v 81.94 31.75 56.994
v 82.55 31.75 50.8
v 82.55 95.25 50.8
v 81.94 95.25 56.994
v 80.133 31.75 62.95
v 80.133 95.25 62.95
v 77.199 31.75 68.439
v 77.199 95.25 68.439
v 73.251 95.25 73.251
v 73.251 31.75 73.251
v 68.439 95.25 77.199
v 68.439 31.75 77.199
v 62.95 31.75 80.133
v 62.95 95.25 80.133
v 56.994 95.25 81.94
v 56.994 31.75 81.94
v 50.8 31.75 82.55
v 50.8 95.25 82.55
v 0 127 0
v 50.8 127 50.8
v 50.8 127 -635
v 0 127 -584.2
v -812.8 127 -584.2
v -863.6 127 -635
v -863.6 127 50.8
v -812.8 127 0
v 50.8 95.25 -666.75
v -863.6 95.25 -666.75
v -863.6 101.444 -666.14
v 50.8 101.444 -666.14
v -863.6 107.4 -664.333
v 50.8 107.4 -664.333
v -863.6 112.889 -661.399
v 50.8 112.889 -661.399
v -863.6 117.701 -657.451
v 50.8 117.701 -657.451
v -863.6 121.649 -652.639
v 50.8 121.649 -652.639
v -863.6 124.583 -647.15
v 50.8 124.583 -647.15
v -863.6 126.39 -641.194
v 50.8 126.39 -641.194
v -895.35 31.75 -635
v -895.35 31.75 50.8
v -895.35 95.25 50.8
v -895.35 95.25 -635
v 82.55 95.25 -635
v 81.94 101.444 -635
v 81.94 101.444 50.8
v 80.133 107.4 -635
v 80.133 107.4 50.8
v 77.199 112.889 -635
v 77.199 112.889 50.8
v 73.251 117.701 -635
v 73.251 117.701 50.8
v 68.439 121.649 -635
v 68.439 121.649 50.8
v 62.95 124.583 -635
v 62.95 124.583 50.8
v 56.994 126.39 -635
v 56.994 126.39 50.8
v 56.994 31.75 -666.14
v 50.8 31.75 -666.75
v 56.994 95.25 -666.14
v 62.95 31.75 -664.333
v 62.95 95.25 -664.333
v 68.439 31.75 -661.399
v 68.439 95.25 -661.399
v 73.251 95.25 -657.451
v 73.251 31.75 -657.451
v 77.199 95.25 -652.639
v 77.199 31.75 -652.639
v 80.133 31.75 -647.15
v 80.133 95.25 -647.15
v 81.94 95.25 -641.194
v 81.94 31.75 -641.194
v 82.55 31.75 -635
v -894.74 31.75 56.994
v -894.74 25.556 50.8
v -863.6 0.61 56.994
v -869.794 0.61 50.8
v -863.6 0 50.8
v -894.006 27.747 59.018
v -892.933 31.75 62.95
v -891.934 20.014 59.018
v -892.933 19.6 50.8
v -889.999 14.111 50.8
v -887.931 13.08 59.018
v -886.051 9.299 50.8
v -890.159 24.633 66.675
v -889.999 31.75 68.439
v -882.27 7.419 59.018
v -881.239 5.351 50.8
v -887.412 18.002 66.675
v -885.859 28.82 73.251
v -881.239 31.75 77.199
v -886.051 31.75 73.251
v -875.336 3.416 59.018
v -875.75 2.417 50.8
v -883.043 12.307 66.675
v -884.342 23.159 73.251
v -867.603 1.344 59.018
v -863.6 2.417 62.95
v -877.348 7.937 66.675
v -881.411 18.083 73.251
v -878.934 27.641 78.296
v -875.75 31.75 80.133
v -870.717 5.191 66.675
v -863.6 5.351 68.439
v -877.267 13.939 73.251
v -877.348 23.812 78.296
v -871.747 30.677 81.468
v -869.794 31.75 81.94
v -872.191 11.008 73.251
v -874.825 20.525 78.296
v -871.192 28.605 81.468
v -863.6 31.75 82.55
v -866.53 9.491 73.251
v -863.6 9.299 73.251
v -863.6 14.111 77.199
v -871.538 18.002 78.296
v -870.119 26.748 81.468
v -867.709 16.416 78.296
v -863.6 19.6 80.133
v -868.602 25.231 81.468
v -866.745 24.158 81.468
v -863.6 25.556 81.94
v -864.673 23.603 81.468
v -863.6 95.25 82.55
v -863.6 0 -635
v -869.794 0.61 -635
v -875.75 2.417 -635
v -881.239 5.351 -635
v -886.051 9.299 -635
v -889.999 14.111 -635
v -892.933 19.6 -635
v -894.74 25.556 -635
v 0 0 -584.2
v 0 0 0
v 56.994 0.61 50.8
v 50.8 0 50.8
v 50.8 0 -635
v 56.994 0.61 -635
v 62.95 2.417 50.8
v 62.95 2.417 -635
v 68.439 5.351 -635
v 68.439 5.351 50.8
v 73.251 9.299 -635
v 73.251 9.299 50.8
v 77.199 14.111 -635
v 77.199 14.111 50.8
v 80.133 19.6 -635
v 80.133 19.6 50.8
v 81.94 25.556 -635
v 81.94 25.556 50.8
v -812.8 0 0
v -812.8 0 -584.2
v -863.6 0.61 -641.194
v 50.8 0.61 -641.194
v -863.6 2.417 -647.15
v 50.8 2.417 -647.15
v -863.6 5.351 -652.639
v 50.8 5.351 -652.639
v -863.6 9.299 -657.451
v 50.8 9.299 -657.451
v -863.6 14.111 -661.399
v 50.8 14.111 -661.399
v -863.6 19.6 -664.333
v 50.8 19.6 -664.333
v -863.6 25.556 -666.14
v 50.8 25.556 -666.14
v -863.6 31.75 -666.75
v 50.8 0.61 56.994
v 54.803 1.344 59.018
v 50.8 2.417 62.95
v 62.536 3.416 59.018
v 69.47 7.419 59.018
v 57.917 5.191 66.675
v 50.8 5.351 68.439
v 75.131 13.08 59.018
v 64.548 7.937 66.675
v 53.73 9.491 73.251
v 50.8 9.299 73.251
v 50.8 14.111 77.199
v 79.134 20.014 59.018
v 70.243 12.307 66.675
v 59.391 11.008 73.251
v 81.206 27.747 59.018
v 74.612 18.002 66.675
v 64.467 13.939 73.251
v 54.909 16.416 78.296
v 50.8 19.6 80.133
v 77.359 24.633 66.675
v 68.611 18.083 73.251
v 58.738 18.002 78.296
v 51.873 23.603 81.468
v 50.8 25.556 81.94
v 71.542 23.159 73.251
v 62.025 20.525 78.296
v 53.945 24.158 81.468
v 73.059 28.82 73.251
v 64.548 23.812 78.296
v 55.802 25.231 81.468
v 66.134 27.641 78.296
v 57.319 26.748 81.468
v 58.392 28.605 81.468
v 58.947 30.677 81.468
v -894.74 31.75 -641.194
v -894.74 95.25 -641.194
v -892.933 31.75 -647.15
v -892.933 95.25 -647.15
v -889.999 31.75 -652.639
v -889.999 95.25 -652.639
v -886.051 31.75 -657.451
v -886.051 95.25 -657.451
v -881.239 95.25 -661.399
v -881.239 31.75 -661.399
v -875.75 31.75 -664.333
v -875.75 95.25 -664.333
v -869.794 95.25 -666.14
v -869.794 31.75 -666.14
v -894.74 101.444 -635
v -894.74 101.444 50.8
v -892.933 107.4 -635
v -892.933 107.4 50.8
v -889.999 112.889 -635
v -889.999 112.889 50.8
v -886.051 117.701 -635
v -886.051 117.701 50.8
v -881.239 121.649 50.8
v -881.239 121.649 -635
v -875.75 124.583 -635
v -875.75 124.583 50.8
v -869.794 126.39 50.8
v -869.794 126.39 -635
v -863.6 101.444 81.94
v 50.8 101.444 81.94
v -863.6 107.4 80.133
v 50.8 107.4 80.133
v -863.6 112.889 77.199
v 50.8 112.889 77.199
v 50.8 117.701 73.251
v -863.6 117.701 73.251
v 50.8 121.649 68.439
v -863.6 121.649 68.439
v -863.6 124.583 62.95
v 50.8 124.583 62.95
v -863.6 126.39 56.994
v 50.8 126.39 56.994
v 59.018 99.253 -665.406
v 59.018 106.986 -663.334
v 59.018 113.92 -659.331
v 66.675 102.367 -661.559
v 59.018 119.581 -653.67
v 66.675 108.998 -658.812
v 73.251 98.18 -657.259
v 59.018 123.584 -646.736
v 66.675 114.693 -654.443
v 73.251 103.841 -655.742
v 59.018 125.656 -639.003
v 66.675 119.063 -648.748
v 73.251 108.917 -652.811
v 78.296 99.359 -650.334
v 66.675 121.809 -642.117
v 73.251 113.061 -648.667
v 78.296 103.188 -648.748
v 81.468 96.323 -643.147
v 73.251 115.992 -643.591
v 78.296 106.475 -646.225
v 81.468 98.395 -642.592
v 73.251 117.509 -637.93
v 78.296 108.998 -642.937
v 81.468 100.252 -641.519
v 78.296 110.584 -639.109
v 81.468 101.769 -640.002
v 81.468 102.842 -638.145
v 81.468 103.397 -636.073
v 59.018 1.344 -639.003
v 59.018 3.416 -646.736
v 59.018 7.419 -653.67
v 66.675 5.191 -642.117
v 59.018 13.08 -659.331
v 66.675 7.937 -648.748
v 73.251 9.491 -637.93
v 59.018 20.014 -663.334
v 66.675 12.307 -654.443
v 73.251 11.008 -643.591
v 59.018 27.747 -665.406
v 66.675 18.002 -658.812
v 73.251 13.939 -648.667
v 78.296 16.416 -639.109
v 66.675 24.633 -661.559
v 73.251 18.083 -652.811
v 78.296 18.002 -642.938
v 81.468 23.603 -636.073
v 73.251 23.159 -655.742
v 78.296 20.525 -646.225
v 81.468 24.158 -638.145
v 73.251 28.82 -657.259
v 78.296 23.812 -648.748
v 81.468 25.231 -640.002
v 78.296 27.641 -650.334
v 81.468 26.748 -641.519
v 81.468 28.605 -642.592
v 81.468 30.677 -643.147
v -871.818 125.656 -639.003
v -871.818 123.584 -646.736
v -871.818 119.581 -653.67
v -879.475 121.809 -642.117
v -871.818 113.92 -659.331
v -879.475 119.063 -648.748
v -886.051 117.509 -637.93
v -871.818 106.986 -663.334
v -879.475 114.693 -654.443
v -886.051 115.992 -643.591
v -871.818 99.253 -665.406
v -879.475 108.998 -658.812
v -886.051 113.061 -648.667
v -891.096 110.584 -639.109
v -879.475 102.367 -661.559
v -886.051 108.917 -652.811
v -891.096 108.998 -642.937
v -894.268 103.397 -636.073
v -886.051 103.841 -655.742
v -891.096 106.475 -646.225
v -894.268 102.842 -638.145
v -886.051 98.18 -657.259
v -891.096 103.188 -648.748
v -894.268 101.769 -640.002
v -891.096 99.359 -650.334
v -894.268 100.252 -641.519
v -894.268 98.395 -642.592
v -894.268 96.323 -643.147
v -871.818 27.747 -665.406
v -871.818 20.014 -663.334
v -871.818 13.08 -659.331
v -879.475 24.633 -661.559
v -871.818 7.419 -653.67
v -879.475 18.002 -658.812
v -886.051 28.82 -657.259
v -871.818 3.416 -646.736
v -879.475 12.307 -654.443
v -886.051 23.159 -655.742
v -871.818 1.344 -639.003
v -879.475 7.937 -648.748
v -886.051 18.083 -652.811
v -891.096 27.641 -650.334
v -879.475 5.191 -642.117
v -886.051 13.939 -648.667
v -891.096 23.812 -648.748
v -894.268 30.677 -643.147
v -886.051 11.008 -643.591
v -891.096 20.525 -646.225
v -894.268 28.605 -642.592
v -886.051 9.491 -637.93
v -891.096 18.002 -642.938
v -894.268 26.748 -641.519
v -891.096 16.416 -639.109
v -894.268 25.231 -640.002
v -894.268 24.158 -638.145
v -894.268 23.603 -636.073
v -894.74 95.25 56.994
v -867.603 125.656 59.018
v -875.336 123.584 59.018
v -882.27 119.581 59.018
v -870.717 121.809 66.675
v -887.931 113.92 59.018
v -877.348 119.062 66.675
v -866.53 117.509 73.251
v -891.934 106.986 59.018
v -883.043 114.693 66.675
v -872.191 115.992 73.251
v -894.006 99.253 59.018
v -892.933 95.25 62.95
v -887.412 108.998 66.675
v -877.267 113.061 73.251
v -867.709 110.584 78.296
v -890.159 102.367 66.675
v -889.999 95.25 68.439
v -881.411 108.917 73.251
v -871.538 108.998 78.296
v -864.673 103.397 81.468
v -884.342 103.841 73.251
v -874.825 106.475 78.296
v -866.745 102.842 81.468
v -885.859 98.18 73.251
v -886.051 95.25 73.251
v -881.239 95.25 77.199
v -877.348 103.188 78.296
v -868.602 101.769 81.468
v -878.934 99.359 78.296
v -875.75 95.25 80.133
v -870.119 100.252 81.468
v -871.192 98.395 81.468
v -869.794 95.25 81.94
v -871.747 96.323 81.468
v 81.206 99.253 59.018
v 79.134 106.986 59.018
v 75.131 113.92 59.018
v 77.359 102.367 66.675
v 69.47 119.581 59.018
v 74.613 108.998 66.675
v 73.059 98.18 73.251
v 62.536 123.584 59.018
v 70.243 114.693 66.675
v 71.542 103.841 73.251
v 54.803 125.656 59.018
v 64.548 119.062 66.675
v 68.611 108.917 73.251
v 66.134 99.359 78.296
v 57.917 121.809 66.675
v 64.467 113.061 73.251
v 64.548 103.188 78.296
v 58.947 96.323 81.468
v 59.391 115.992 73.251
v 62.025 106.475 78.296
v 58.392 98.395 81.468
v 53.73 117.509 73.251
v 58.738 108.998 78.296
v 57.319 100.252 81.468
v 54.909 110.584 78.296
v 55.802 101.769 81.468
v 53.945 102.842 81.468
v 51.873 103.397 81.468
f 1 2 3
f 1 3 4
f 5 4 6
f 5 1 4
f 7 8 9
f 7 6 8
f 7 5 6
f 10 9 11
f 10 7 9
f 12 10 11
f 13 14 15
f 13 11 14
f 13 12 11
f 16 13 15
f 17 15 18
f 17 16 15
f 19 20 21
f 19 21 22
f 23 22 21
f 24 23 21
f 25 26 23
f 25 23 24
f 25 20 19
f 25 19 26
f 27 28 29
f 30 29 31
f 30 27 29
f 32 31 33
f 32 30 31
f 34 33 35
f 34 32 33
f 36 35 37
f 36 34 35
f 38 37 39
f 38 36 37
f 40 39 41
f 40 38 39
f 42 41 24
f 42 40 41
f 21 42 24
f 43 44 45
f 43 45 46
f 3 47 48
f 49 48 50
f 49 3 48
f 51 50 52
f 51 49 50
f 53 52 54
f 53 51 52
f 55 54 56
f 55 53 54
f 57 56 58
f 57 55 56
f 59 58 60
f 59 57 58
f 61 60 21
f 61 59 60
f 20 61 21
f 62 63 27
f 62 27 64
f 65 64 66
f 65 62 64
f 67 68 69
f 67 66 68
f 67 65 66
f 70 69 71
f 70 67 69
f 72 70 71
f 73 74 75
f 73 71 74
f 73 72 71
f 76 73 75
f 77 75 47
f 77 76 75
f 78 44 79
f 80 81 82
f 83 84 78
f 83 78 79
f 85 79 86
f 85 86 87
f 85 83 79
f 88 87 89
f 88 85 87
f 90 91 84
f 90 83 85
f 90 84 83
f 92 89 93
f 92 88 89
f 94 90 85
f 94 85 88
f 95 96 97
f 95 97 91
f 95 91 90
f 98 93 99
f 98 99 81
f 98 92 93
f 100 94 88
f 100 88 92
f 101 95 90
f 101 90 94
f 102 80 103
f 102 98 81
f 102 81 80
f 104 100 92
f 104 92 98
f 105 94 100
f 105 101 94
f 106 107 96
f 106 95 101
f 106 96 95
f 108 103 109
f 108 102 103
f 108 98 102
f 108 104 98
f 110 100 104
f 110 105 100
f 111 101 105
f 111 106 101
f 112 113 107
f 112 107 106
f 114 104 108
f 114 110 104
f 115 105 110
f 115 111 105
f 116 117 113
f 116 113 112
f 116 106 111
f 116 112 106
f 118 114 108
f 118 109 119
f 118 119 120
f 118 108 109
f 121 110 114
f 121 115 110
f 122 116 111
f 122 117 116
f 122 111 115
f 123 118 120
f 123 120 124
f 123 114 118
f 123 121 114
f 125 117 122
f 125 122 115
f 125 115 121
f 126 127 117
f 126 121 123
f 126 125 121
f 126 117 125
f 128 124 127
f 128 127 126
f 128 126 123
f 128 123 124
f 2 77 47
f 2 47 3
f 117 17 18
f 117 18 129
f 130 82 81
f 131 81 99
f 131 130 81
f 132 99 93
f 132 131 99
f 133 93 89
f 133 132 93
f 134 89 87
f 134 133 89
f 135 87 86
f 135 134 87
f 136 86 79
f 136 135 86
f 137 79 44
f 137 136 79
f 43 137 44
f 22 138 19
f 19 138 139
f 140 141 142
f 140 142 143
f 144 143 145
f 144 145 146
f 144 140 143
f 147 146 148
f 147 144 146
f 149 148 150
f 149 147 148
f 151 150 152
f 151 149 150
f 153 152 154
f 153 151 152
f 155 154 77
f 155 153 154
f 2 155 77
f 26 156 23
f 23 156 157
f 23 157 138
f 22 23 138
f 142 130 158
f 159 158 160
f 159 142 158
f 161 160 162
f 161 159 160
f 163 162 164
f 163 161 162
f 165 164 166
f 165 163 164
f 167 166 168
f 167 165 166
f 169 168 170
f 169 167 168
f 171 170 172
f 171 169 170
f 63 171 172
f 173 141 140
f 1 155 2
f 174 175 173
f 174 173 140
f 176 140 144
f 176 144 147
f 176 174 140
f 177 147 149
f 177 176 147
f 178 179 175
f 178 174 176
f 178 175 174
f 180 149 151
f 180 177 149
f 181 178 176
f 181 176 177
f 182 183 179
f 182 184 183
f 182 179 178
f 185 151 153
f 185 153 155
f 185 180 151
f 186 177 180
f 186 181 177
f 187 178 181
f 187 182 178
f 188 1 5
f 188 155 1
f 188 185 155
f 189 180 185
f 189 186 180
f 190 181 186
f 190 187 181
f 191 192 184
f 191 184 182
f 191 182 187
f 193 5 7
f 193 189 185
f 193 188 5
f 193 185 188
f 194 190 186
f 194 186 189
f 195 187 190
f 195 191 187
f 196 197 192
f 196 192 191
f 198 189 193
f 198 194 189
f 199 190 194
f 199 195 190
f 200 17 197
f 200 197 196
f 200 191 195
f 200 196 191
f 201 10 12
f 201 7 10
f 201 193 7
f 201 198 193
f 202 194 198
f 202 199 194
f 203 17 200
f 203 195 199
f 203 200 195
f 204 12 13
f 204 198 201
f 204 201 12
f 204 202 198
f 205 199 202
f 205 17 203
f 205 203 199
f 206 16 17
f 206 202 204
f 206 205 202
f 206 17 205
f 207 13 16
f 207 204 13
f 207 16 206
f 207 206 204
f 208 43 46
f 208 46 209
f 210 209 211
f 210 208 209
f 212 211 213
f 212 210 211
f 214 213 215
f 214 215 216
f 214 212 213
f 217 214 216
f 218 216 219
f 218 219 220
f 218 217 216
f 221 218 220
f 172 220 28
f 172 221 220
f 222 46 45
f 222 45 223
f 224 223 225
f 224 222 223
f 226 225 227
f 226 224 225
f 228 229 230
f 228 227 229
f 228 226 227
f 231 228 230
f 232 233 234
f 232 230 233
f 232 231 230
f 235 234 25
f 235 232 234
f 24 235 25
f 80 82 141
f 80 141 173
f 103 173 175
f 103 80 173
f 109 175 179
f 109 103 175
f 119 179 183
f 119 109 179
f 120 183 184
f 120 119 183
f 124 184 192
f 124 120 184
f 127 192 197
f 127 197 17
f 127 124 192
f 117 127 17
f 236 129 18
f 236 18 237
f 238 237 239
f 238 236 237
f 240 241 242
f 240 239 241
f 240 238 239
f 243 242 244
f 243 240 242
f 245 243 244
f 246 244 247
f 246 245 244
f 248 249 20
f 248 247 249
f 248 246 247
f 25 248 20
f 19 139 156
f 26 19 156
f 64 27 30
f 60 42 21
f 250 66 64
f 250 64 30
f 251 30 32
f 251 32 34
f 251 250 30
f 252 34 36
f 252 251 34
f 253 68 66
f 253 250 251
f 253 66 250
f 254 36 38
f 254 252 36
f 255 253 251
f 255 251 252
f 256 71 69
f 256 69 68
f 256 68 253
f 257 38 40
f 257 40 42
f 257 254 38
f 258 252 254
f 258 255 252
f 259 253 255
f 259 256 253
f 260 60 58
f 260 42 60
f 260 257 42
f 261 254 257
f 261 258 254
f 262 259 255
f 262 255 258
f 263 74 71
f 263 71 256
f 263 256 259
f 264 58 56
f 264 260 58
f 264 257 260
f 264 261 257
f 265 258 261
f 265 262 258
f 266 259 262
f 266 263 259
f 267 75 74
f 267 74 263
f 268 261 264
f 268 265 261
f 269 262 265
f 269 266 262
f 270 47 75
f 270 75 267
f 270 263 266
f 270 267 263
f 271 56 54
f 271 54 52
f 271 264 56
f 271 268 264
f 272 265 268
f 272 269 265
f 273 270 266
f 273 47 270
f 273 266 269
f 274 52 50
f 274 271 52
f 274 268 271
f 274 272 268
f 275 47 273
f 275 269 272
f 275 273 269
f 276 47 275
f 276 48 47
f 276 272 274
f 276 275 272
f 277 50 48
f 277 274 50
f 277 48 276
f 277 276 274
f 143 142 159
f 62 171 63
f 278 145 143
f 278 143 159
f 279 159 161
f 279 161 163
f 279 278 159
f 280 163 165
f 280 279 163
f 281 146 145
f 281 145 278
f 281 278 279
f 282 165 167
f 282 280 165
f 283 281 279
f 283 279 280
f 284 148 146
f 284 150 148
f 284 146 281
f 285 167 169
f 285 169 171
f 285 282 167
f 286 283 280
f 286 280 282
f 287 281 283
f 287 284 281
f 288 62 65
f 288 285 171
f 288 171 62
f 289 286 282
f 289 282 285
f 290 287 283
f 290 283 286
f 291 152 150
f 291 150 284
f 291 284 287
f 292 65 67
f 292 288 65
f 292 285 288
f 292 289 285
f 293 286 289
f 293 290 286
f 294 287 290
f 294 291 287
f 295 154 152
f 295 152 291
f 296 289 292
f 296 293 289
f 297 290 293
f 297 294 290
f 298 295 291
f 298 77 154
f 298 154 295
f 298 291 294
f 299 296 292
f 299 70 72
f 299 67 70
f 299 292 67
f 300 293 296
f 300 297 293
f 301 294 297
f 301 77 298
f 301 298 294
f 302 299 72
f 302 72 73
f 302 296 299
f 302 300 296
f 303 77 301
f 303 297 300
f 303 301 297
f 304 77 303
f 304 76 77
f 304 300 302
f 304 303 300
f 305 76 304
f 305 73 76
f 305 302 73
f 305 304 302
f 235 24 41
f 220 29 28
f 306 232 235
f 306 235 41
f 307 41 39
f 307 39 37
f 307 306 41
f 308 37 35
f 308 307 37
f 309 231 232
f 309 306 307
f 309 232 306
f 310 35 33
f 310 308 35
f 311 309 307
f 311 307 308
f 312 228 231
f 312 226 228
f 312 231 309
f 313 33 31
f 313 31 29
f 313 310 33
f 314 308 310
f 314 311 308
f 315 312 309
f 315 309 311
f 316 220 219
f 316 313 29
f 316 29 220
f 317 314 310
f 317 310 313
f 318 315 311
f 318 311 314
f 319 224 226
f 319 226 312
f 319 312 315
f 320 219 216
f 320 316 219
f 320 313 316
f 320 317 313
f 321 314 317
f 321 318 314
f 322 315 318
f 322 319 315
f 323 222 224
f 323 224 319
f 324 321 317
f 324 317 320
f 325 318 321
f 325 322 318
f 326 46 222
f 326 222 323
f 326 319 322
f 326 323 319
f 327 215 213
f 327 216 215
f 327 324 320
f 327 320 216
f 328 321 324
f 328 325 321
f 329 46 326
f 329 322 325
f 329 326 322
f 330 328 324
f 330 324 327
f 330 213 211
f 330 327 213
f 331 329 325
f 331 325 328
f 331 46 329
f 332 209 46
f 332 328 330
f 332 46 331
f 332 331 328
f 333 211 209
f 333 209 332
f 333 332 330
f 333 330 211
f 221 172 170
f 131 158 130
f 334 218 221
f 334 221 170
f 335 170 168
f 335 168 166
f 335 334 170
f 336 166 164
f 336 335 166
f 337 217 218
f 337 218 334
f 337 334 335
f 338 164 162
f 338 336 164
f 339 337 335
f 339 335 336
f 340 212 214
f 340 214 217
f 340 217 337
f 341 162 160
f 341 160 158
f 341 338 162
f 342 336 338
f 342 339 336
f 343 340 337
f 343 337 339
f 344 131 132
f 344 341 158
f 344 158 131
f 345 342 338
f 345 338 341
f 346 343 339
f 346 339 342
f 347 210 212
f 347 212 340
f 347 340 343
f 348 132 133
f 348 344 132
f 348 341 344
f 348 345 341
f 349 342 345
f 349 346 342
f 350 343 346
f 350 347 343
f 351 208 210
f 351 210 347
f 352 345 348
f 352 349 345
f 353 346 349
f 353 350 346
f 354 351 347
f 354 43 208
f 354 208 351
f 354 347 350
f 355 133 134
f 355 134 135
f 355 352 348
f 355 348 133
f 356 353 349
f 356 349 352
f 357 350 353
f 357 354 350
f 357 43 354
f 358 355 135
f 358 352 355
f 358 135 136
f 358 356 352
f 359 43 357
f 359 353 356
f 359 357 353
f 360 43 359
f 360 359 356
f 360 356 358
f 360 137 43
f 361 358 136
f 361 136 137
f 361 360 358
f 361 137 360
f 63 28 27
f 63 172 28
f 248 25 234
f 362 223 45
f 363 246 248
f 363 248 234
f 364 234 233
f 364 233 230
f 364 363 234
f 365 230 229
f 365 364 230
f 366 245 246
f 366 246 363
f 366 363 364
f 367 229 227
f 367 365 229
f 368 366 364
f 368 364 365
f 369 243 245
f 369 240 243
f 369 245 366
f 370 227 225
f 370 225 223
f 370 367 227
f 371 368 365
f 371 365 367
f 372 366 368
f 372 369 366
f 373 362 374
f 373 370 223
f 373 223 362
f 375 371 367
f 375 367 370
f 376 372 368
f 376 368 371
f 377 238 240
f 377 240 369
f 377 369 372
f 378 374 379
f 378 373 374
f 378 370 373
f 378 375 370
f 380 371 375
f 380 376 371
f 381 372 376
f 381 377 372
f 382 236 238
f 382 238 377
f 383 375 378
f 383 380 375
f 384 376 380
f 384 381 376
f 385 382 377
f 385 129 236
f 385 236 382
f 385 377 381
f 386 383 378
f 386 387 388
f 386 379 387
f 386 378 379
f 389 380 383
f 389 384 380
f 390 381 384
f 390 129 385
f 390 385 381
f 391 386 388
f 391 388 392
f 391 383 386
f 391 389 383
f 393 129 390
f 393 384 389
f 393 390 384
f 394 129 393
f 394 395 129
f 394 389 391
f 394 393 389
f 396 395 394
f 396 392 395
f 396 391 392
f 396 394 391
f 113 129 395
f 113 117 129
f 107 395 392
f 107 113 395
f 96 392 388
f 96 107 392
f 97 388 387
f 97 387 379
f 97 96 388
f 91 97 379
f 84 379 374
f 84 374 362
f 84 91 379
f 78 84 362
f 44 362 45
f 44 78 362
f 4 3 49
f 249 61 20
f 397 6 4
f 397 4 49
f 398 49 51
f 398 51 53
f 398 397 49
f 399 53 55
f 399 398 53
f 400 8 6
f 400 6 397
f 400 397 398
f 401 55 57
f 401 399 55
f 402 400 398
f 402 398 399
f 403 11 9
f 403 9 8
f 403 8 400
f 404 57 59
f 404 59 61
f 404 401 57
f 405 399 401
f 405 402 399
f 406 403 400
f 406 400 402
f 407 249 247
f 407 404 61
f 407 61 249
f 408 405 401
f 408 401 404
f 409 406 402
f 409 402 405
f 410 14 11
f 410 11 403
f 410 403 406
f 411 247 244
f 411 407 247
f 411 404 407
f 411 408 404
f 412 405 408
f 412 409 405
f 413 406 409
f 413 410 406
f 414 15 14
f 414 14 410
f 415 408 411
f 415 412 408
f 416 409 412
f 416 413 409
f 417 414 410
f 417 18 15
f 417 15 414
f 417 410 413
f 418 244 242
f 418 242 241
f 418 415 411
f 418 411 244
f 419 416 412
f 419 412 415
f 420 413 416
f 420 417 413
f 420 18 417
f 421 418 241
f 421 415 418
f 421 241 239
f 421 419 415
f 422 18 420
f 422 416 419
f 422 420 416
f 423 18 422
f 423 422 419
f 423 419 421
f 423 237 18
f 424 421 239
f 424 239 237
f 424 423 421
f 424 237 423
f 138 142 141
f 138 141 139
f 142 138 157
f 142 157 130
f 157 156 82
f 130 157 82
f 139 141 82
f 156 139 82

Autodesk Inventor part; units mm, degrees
ref_plane "YZ Plane" through (0, 0, 0) normal (1, 0, 0) x (0, 1, 0)
ref_plane "XZ Plane" through (0, 0, 0) normal (0, 1, 0) x (-1, 0, 0)
ref_plane "XY Plane" through (0, 0, 0) normal (0, 0, 1) x (1, 0, 0)
sketch "Sketch1" plane through (0, 0, 0) normal (0, 1, 0) x (-1, 0, 0)
  line L0 (0, 0) -> (812.8, 0)
  line L1 (812.8, 0) -> (812.8, -584.2)
  line L2 (812.8, -584.2) -> (0, -584.2)
  line L3 (0, -584.2) -> (0, 0)
  line L4 (-82.55, 82.55) -> (895.35, 82.55)
  line L5 (895.35, 82.55) -> (895.35, -666.75)
  line L6 (895.35, -666.75) -> (-82.55, -666.75)
  line L7 (-82.55, -666.75) -> (-82.55, 82.55)
  dimension "d0" = 812.8
  dimension "d1" = 584.2
  dimension "d2" = 82.55
  dimension "d3" = 82.55
  dimension "d4" = 82.55
  dimension "d5" = 82.55
extrude "Extrusion1" add sketch "Sketch1" along normal blind 127
fillet "Fillet1" radius 31.75 8 edges at (-406.4, 127, 82.55) (82.55, 127, -292.1) (-406.4, 0, 82.55) (82.55, 0, -292.1) (-895.35, 127, -292.1) (-406.4, 127, -666.75) (-406.4, 0, -666.75) (-895.35, 0, -292.1)
fillet "Fillet2" radius 31.75 12 edges at (-886.0506, 117.7006, 73.2506) (-886.0506, 9.2994, 73.2506) (-895.35, 63.5, 82.55) (-886.0506, 117.7006, -657.4506) (-886.0506, 9.2994, -657.4506) (-895.35, 63.5, -666.75) (73.2506, 117.7006, 73.2506) (73.2506, 9.2994, 73.2506) (82.55, 63.5, 82.55) (73.2506, 117.7006, -657.4506) (73.2506, 9.2994, -657.4506) (82.55, 63.5, -666.75)
properties part number "bumpers"
